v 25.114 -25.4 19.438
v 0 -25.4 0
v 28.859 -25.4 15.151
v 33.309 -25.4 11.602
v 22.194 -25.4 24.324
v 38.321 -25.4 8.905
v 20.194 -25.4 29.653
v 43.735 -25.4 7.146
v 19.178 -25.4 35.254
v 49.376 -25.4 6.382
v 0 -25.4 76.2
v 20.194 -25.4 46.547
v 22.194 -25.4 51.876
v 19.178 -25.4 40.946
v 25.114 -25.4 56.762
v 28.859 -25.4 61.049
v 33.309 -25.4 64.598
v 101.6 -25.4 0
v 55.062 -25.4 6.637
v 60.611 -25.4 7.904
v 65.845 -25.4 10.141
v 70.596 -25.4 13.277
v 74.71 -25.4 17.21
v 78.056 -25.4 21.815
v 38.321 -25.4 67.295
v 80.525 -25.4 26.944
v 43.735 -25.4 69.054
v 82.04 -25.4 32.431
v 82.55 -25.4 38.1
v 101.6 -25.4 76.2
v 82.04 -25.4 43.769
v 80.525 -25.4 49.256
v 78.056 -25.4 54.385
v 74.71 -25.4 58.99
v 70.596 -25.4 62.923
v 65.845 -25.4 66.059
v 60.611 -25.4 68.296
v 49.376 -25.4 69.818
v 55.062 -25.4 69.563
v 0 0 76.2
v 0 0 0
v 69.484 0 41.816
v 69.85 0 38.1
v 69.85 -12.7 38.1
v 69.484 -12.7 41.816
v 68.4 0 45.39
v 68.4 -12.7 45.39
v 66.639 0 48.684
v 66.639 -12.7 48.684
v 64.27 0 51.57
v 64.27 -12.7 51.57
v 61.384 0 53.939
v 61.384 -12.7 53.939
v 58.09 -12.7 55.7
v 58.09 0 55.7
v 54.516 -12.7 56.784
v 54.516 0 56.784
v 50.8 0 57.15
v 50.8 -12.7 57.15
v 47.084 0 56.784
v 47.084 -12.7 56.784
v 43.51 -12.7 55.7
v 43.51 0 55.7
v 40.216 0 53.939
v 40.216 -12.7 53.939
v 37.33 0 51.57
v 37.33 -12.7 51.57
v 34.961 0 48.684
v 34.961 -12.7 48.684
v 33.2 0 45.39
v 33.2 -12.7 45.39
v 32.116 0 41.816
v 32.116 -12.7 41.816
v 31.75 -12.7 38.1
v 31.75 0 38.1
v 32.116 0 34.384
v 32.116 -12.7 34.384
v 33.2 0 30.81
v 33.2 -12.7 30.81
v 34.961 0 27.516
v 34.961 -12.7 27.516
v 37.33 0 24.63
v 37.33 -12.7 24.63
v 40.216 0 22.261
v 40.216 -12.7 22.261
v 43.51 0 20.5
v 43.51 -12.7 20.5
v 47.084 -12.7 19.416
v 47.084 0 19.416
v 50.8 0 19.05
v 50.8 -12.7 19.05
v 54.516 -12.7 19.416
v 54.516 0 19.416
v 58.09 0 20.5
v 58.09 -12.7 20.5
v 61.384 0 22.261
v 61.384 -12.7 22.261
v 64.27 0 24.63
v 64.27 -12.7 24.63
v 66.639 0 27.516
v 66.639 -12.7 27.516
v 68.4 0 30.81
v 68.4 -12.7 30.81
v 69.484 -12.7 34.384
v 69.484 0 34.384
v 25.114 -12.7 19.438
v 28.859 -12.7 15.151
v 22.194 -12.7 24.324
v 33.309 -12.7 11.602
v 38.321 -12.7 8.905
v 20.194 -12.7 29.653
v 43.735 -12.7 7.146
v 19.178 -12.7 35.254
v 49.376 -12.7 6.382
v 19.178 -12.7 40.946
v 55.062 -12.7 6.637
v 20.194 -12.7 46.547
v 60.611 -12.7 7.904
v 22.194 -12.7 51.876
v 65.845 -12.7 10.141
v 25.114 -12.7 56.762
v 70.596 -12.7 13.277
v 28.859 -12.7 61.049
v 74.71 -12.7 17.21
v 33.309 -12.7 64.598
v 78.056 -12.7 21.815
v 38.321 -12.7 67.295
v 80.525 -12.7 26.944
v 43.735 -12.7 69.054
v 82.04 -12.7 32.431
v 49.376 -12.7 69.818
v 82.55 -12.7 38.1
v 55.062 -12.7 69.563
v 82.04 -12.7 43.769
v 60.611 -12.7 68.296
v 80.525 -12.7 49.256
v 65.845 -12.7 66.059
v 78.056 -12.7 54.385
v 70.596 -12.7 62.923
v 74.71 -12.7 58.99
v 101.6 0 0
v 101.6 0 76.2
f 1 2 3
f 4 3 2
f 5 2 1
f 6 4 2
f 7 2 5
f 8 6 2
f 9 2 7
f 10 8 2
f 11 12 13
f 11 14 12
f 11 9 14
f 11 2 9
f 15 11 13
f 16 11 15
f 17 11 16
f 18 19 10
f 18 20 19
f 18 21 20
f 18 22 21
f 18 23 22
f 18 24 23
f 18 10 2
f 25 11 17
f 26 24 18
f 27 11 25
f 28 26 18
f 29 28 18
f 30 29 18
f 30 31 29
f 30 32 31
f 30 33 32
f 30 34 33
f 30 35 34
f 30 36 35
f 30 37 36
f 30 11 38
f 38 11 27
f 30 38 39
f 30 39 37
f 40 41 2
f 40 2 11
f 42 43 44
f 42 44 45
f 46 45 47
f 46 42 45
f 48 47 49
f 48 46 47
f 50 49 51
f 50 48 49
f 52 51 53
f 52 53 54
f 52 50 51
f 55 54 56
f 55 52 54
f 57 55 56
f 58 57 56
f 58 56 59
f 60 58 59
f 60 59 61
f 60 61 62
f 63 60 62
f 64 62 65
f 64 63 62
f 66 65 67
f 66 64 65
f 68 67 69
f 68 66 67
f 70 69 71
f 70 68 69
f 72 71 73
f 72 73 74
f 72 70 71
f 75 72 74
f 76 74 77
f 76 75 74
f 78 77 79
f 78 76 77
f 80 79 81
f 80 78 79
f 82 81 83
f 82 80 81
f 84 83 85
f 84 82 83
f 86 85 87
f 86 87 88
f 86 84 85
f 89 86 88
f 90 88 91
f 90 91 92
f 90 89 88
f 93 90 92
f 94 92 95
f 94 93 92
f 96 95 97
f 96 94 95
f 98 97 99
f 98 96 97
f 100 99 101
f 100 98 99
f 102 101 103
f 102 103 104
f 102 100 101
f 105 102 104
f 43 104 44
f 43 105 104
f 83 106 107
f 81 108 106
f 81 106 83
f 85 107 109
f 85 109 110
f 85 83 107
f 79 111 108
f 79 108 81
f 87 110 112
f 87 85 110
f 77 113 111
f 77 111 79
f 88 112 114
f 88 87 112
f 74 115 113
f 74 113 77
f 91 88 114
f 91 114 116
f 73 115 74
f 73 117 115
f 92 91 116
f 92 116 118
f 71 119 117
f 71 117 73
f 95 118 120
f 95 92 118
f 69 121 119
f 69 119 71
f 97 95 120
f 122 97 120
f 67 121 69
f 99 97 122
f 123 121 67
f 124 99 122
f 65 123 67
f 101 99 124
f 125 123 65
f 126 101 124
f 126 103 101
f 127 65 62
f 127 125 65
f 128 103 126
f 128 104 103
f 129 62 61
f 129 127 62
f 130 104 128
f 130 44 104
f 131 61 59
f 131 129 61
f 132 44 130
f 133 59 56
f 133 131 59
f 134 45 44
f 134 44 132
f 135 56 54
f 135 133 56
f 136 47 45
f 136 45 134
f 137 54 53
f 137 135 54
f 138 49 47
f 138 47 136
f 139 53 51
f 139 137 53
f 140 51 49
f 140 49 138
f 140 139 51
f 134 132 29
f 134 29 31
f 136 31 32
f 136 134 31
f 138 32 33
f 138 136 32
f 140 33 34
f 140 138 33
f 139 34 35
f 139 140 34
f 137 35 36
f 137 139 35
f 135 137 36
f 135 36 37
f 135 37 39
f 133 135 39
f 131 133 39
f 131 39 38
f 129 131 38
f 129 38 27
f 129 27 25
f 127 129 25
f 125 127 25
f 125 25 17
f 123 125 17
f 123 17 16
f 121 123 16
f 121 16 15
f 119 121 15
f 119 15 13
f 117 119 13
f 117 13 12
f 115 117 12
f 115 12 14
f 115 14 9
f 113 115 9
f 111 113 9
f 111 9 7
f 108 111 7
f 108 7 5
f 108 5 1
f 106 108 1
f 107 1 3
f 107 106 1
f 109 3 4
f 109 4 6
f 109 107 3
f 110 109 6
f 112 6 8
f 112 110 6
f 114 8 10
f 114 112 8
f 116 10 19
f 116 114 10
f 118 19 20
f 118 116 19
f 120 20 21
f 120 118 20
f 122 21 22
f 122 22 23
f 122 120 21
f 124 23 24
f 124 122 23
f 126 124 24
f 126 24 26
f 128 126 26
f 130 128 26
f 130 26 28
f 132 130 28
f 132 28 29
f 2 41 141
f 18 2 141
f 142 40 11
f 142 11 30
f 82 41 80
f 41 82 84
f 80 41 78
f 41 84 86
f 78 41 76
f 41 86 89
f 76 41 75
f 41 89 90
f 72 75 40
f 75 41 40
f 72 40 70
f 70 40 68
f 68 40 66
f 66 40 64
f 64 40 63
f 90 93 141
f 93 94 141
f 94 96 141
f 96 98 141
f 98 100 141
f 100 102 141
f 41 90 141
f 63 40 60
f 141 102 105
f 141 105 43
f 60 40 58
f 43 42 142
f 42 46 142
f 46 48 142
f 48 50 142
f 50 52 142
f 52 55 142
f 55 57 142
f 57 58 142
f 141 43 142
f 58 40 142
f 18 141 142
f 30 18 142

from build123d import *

# Parameters (mm, degrees)
F0_W     = 101.6
F0_H     = 76.2
F0_R     = 31.75
F1_DEPTH = 25.4
F0_R_2   = 19.05
F2_DEPTH = 12.7


with BuildPart() as f1:
    # F0 (on Front) → F1 (new body)
    with BuildSketch(Plane.XZ):
        with Locations((50.8, 38.1)):
            Rectangle(F0_W, F0_H)
        with Locations((50.8, 38.1)):
            Circle(F0_R, mode=Mode.SUBTRACT)
    extrude(amount=F1_DEPTH)

    # F0 (on Front) → F2 (join)
    with BuildSketch(Plane.XZ):
        with Locations((50.8, 38.1)):
            Circle(F0_R)
        with Locations((50.8, 38.1)):
            Circle(F0_R_2, mode=Mode.SUBTRACT)
    extrude(amount=F2_DEPTH)


solid = f1.part
